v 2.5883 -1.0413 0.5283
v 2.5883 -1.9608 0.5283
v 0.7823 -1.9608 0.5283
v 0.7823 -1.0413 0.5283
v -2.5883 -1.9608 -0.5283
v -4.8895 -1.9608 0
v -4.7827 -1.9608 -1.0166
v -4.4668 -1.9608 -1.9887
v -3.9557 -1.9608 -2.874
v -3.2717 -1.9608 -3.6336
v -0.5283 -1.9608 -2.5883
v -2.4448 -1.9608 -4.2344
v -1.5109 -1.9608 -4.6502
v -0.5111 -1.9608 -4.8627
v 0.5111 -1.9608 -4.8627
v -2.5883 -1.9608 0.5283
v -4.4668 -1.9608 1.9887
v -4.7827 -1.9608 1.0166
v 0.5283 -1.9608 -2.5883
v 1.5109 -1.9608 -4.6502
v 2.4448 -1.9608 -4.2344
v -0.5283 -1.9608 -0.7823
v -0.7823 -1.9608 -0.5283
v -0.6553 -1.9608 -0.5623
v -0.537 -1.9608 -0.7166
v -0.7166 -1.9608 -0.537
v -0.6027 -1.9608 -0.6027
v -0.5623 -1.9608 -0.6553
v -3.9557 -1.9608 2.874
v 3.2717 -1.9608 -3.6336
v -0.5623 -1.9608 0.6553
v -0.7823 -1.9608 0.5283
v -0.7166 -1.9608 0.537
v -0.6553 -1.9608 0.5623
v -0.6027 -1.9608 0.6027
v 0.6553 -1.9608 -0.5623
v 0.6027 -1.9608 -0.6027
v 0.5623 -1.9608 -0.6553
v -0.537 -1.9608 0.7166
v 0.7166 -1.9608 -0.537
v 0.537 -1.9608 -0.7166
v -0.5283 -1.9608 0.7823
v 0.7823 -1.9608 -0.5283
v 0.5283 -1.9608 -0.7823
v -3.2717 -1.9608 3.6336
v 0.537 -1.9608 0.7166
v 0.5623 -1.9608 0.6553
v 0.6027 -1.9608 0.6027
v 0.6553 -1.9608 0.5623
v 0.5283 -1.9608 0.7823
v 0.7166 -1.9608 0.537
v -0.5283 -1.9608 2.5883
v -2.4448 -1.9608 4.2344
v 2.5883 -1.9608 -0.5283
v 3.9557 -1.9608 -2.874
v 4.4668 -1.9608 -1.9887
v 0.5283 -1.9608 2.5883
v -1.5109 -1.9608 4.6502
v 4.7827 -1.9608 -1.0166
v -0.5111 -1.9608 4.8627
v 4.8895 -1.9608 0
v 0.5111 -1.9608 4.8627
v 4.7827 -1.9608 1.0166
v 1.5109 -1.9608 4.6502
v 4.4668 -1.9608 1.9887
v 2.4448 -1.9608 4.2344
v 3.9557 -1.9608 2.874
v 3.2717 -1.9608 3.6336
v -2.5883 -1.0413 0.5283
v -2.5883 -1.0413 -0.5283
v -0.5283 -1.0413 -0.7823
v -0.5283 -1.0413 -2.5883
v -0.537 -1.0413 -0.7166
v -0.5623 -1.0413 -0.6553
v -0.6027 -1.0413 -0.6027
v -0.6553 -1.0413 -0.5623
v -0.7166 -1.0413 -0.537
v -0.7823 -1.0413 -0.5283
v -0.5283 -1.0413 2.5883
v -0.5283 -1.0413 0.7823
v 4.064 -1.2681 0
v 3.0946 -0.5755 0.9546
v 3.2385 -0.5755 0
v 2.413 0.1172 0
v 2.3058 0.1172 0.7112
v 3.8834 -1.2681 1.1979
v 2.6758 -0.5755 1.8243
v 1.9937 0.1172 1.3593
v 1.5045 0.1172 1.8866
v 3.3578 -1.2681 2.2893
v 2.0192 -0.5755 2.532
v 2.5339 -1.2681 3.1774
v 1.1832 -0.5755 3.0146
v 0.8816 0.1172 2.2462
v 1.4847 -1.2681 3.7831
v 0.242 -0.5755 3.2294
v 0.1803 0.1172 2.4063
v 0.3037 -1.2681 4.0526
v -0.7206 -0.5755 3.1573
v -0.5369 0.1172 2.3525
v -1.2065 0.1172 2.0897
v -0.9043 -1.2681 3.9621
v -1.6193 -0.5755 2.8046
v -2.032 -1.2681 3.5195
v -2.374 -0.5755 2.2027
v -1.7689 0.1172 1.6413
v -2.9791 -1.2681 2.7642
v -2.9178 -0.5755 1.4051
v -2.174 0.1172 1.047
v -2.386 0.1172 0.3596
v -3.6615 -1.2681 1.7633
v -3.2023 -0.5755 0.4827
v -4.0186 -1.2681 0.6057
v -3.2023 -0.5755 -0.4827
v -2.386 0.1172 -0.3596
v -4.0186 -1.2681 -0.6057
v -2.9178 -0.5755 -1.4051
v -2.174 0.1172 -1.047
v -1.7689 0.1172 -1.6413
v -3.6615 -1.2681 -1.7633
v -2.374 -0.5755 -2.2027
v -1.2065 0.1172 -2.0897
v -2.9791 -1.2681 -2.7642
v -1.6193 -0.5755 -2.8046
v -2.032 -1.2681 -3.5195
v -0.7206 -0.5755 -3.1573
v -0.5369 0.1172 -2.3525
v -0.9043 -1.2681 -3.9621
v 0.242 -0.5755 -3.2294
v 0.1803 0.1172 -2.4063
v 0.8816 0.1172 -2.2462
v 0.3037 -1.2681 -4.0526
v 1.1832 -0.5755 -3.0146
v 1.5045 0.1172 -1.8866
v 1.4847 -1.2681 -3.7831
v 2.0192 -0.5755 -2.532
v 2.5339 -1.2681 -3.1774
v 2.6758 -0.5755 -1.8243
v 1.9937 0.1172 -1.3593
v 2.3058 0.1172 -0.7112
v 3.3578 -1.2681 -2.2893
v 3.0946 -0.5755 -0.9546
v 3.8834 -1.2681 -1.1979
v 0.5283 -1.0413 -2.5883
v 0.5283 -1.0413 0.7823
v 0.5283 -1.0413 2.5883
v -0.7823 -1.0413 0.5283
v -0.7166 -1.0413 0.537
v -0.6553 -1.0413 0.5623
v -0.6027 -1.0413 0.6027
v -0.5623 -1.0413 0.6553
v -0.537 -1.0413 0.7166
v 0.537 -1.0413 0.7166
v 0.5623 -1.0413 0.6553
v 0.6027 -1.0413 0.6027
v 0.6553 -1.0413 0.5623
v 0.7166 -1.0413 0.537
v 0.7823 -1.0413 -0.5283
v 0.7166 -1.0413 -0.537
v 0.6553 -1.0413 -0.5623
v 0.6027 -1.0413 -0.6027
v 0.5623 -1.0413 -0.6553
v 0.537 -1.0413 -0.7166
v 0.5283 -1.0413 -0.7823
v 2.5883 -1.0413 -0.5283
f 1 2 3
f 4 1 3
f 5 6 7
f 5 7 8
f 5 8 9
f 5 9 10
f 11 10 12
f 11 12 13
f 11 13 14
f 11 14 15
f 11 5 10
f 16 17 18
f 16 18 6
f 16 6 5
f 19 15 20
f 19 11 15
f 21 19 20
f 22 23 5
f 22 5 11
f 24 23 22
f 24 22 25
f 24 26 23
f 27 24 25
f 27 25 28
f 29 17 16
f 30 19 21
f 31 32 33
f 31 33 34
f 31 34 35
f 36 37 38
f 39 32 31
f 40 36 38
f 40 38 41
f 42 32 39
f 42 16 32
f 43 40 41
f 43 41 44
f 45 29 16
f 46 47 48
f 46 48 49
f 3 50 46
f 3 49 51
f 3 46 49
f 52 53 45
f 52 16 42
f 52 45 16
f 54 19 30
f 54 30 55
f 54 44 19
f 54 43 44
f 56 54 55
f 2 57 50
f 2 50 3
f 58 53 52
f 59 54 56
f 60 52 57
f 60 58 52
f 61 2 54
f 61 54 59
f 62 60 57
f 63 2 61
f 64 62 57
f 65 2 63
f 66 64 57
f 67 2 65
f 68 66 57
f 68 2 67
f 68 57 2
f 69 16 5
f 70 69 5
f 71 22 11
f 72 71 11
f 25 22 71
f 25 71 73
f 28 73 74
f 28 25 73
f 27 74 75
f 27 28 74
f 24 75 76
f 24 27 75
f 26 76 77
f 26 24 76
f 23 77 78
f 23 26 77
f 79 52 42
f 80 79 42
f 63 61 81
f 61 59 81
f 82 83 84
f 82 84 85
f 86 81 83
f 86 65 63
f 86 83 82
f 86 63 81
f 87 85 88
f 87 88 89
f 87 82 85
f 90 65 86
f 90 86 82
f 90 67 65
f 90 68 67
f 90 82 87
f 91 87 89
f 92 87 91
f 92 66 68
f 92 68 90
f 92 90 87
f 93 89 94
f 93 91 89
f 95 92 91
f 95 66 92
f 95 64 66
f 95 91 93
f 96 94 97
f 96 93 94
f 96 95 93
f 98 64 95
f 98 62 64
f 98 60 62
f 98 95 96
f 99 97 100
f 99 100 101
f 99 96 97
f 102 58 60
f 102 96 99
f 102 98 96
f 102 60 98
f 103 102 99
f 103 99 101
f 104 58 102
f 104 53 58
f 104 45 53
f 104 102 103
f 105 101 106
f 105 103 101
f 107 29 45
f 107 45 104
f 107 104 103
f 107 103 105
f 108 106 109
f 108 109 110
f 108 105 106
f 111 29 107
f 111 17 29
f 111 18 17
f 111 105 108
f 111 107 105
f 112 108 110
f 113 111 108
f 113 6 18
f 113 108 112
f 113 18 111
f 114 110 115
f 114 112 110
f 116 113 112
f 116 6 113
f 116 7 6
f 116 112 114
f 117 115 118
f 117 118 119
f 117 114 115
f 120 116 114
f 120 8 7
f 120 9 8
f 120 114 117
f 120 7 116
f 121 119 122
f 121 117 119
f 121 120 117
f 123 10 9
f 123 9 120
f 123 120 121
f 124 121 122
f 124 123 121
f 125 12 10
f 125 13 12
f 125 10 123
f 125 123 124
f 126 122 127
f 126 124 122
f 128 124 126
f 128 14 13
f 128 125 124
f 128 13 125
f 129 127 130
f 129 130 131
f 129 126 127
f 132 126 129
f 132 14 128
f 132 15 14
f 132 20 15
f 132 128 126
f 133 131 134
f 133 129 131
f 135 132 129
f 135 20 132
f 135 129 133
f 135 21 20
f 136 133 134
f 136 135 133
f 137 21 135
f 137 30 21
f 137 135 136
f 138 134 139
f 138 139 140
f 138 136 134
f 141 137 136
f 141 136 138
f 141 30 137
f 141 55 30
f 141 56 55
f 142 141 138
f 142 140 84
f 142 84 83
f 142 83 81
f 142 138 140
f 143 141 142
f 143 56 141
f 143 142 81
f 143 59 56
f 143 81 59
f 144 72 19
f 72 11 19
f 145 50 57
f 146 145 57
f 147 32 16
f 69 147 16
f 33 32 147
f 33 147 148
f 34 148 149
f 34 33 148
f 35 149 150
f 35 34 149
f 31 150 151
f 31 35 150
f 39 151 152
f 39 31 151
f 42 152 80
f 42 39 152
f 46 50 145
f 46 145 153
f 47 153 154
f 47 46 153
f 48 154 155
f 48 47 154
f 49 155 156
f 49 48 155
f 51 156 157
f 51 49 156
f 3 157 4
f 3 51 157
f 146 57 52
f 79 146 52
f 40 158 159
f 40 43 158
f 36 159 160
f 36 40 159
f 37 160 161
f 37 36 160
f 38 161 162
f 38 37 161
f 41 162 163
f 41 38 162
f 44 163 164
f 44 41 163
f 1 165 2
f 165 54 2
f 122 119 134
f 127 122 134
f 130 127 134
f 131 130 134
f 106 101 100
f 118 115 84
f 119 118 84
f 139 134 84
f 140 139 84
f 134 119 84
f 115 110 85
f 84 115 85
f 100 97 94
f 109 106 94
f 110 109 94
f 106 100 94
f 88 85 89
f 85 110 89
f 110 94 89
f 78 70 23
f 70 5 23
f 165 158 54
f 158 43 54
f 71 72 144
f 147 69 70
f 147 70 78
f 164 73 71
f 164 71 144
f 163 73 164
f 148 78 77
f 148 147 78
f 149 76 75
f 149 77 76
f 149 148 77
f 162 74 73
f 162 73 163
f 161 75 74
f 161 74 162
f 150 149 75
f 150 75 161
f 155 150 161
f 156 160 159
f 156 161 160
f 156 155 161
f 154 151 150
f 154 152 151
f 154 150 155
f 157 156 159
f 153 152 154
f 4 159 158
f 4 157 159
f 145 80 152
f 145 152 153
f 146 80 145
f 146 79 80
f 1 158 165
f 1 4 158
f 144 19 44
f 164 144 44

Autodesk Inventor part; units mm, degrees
sketch "Sketch_3" plane through (0, 0, 0) normal (0, 0, 1) x (1, 0, 0)
  line L0 (0, -1.9608) -> (0, 0.1172)
  line L1 (0, 0.1172) -> (2.413, 0.1172)
  line L2 (2.413, 0.1172) -> (4.8895, -1.9608)
  line L3 (4.8895, -1.9608) -> (0, -1.9608)
  line L4 (0, -1.9608) -> (0, 0.1172)
revolve "Revolution1" add sketch "Sketch_3" angle 360 about axis through (0, -1.9608, 0) along (0, -1, 0)
sketch "Sketch_4" plane through (0, -1.9608, 0) normal (0, -1, 0) x (1, 0, 0)
  line L0 (-2.5883, 0.5283) -> (-2.5883, -0.5283)
  line L1 (-2.5883, -0.5283) -> (-0.7823, -0.5283)
  arc A0 (-0.5283, -0.7823) -> (-0.7823, -0.5283) centre (-0.7823, -0.7823) ccw
  line L2 (-0.5283, -0.7823) -> (-0.5283, -2.5883)
  line L3 (-0.5283, -2.5883) -> (0.5283, -2.5883)
  line L4 (0.5283, -2.5883) -> (0.5283, -0.7823)
  arc A1 (0.7823, -0.5283) -> (0.5283, -0.7823) centre (0.7823, -0.7823) ccw
  line L5 (0.7823, -0.5283) -> (2.5883, -0.5283)
  line L6 (2.5883, -0.5283) -> (2.5883, 0.5283)
  line L7 (2.5883, 0.5283) -> (0.7823, 0.5283)
  arc A2 (0.5283, 0.7823) -> (0.7823, 0.5283) centre (0.7823, 0.7823) ccw
  line L8 (0.5283, 0.7823) -> (0.5283, 2.5883)
  line L9 (0.5283, 2.5883) -> (-0.5283, 2.5883)
  line L10 (-0.5283, 2.5883) -> (-0.5283, 0.7823)
  arc A3 (-0.7823, 0.5283) -> (-0.5283, 0.7823) centre (-0.7823, 0.7823) ccw
  line L11 (-0.7823, 0.5283) -> (-2.5883, 0.5283)
extrude "Extrusion1" cut sketch "Sketch_4" against normal blind 0.9195
ref_plane "screw_XY" through (0, 0, 0) normal (0, 1, 0) x (1, 0, 0)
ref_plane "screw_YZ" through (0, 0, 0) normal (1, 0, 0) x (0, 0, -1)
ref_plane "screw_ZX" through (0, 0, 0) normal (0, 0, -1) x (0, 1, 0)
properties part number "3628_"
